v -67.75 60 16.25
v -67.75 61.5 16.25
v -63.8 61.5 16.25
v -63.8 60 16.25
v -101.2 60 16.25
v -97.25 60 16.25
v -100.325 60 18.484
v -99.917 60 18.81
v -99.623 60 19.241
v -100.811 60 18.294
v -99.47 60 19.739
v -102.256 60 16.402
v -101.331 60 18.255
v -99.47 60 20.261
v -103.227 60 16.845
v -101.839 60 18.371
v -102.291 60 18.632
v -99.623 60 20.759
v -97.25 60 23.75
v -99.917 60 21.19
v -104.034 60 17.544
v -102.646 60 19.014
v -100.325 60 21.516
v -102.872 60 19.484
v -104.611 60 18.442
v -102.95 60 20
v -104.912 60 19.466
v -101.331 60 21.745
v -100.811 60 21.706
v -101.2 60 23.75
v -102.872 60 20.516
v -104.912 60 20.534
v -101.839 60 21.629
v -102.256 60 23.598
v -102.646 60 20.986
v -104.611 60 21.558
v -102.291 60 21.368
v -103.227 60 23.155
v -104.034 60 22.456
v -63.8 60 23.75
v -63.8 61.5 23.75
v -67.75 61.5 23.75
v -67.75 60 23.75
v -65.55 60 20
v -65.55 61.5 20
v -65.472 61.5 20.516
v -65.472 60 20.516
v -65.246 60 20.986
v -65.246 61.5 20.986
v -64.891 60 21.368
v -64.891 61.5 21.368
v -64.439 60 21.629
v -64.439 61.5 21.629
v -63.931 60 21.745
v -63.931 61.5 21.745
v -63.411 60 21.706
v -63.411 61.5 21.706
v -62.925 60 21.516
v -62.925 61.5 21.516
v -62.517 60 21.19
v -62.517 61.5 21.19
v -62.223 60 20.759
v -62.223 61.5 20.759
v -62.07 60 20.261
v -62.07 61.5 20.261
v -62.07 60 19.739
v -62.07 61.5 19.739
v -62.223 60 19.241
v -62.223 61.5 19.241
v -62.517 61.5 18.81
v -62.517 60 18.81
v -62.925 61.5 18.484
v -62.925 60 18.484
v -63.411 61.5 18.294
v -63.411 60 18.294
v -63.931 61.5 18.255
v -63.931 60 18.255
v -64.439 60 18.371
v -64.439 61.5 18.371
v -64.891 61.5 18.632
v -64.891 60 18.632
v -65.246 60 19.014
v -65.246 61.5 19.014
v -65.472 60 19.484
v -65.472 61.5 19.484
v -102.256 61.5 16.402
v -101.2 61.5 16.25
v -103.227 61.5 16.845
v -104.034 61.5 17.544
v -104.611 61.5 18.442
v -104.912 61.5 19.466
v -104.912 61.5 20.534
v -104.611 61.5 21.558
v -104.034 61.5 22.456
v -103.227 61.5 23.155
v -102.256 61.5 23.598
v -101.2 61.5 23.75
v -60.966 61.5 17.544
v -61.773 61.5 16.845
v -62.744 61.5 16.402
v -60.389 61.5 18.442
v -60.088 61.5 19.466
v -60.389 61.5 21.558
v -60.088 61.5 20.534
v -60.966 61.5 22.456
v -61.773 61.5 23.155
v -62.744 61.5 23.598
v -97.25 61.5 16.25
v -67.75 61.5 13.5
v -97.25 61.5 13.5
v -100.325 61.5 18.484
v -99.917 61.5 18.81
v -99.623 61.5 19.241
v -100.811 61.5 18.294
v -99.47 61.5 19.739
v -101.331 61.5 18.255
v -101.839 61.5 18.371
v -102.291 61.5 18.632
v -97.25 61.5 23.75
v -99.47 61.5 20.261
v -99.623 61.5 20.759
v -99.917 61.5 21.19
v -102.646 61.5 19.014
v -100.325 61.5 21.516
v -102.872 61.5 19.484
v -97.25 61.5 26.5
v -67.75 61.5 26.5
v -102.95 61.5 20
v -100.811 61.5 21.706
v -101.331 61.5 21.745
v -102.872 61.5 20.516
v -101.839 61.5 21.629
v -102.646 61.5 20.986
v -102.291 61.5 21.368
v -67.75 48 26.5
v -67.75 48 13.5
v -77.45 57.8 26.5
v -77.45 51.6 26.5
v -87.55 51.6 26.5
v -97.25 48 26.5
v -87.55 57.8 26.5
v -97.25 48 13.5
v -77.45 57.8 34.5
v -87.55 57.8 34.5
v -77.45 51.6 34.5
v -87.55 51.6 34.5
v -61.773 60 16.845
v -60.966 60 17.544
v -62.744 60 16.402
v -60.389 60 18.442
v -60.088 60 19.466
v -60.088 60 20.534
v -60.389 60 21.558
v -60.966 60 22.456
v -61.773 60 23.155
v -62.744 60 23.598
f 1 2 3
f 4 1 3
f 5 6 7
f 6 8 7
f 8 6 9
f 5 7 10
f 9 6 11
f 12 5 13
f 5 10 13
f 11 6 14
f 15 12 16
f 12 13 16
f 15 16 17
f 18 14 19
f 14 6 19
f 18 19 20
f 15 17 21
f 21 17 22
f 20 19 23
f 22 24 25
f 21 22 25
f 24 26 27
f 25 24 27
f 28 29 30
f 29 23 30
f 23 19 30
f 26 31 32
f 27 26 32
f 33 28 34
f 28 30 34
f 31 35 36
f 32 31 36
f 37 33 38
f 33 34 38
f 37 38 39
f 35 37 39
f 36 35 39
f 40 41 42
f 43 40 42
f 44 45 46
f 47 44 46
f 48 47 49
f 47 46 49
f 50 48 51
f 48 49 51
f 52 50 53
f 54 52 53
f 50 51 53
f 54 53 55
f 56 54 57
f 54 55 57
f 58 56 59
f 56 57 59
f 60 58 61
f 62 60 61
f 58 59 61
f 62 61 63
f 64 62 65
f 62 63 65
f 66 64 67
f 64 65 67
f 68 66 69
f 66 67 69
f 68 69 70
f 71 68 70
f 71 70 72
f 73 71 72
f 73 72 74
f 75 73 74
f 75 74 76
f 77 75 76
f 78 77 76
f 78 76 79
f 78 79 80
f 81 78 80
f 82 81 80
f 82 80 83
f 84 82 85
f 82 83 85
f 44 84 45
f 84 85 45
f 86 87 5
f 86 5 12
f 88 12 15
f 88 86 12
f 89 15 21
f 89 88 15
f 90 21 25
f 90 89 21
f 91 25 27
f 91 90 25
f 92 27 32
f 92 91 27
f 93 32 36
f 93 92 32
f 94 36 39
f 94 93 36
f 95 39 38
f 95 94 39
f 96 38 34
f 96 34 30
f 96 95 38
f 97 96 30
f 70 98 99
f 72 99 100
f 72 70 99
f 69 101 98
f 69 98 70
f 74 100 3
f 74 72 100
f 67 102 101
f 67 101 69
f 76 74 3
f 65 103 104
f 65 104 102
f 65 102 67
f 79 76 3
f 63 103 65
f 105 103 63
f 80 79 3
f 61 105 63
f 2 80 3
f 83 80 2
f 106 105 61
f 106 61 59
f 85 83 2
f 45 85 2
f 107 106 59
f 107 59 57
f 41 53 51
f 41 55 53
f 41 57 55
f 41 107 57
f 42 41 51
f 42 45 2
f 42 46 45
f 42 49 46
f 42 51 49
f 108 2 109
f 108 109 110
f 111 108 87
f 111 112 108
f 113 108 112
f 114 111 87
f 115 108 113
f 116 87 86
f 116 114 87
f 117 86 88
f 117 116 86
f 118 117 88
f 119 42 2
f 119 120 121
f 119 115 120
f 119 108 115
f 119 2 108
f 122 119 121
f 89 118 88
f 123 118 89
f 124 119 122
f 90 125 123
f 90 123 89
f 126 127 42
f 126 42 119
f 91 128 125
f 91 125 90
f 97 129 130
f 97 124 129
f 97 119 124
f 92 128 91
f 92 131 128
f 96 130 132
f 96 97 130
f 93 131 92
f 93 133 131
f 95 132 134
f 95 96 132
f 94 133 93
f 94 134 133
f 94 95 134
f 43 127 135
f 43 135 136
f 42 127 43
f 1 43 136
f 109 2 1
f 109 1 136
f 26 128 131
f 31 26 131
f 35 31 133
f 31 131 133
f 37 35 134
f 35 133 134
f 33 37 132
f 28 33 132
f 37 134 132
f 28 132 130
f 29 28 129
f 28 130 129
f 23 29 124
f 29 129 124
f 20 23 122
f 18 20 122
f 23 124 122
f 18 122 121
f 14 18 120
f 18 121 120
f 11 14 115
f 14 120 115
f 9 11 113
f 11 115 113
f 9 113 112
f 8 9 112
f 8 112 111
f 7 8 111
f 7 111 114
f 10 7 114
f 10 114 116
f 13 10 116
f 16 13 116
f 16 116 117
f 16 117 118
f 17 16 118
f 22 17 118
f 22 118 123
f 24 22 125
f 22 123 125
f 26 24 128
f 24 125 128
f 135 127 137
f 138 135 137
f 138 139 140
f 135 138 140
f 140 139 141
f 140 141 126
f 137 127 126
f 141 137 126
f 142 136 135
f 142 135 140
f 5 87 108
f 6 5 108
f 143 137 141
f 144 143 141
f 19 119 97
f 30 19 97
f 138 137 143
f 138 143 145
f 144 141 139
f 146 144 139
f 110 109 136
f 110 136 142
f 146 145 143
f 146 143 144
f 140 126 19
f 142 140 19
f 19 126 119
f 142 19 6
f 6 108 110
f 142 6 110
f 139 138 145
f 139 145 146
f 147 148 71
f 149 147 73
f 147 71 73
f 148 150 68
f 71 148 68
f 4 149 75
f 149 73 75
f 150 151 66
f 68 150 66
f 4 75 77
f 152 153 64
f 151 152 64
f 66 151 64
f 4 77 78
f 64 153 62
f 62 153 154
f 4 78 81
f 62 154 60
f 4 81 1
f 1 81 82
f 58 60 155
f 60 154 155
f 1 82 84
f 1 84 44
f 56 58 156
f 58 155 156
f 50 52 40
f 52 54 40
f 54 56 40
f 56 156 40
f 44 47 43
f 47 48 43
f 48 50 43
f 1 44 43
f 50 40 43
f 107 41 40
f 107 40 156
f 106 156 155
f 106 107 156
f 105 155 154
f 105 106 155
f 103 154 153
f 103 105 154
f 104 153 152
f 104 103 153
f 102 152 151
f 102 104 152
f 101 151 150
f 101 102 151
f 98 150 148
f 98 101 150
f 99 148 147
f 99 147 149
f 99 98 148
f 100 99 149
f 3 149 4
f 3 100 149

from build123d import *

# Parameters (mm, degrees)
SKETCH034_W             = 29.5
SKETCH034_H             = 13
PAD022_DEPTH            = 13.5
SKETCH035_R             = 1.75
PAD023_DEPTH            = 1.5
SKETCH036_W             = 10.1
SKETCH036_H             = 6.2
PAD024_DEPTH            = 8
BODY006_PLACEMENT_ANGLE = 180


with BuildPart() as part:
    # Sketch034 → Pad022 (new body)
    with BuildSketch(Plane.XZ):
        Rectangle(SKETCH034_W, SKETCH034_H)
    extrude(amount=PAD022_DEPTH)

    # Sketch035 (on Face5 of Pad022) → Pad023 (join)
    with BuildSketch(Plane(origin=(0, 0, 0), x_dir=(1, 0, 0), z_dir=(0, 1, 0))):
        with BuildLine():
            ThreePointArc((-18.7, 3.75), (-22.45, 0), (-18.7, -3.75))
            Line((18.69999, -3.75), (-18.7, -3.75))
            ThreePointArc((18.69999, -3.75), (22.45, -5e-06), (18.7, 3.75))
            Line((-18.7, 3.75), (18.7, 3.75))
        make_face()
        with Locations((-18.7, 0)):
            Circle(SKETCH035_R, mode=Mode.SUBTRACT)
        with Locations((18.7, 0)):
            Circle(SKETCH035_R, mode=Mode.SUBTRACT)
    extrude(amount=-PAD023_DEPTH)

    # Sketch036 (on Face10 of Pad023) → Pad024 (join)
    with BuildSketch(Plane(origin=(0, 0, -6.5), x_dir=(1, 0, 0), z_dir=(0, 0, -1))):
        with Locations((0, 6.8)):
            Rectangle(SKETCH036_W, SKETCH036_H)
    extrude(amount=PAD024_DEPTH)


with BuildPart() as part_1:
    # Body006 placement: moved
    add(part.part.moved(Location((-82.5, 61.5, 20))).rotate(Axis((-82.5, 61.5, 20), (0, 1, 0)), BODY006_PLACEMENT_ANGLE))


solid = part_1.part
